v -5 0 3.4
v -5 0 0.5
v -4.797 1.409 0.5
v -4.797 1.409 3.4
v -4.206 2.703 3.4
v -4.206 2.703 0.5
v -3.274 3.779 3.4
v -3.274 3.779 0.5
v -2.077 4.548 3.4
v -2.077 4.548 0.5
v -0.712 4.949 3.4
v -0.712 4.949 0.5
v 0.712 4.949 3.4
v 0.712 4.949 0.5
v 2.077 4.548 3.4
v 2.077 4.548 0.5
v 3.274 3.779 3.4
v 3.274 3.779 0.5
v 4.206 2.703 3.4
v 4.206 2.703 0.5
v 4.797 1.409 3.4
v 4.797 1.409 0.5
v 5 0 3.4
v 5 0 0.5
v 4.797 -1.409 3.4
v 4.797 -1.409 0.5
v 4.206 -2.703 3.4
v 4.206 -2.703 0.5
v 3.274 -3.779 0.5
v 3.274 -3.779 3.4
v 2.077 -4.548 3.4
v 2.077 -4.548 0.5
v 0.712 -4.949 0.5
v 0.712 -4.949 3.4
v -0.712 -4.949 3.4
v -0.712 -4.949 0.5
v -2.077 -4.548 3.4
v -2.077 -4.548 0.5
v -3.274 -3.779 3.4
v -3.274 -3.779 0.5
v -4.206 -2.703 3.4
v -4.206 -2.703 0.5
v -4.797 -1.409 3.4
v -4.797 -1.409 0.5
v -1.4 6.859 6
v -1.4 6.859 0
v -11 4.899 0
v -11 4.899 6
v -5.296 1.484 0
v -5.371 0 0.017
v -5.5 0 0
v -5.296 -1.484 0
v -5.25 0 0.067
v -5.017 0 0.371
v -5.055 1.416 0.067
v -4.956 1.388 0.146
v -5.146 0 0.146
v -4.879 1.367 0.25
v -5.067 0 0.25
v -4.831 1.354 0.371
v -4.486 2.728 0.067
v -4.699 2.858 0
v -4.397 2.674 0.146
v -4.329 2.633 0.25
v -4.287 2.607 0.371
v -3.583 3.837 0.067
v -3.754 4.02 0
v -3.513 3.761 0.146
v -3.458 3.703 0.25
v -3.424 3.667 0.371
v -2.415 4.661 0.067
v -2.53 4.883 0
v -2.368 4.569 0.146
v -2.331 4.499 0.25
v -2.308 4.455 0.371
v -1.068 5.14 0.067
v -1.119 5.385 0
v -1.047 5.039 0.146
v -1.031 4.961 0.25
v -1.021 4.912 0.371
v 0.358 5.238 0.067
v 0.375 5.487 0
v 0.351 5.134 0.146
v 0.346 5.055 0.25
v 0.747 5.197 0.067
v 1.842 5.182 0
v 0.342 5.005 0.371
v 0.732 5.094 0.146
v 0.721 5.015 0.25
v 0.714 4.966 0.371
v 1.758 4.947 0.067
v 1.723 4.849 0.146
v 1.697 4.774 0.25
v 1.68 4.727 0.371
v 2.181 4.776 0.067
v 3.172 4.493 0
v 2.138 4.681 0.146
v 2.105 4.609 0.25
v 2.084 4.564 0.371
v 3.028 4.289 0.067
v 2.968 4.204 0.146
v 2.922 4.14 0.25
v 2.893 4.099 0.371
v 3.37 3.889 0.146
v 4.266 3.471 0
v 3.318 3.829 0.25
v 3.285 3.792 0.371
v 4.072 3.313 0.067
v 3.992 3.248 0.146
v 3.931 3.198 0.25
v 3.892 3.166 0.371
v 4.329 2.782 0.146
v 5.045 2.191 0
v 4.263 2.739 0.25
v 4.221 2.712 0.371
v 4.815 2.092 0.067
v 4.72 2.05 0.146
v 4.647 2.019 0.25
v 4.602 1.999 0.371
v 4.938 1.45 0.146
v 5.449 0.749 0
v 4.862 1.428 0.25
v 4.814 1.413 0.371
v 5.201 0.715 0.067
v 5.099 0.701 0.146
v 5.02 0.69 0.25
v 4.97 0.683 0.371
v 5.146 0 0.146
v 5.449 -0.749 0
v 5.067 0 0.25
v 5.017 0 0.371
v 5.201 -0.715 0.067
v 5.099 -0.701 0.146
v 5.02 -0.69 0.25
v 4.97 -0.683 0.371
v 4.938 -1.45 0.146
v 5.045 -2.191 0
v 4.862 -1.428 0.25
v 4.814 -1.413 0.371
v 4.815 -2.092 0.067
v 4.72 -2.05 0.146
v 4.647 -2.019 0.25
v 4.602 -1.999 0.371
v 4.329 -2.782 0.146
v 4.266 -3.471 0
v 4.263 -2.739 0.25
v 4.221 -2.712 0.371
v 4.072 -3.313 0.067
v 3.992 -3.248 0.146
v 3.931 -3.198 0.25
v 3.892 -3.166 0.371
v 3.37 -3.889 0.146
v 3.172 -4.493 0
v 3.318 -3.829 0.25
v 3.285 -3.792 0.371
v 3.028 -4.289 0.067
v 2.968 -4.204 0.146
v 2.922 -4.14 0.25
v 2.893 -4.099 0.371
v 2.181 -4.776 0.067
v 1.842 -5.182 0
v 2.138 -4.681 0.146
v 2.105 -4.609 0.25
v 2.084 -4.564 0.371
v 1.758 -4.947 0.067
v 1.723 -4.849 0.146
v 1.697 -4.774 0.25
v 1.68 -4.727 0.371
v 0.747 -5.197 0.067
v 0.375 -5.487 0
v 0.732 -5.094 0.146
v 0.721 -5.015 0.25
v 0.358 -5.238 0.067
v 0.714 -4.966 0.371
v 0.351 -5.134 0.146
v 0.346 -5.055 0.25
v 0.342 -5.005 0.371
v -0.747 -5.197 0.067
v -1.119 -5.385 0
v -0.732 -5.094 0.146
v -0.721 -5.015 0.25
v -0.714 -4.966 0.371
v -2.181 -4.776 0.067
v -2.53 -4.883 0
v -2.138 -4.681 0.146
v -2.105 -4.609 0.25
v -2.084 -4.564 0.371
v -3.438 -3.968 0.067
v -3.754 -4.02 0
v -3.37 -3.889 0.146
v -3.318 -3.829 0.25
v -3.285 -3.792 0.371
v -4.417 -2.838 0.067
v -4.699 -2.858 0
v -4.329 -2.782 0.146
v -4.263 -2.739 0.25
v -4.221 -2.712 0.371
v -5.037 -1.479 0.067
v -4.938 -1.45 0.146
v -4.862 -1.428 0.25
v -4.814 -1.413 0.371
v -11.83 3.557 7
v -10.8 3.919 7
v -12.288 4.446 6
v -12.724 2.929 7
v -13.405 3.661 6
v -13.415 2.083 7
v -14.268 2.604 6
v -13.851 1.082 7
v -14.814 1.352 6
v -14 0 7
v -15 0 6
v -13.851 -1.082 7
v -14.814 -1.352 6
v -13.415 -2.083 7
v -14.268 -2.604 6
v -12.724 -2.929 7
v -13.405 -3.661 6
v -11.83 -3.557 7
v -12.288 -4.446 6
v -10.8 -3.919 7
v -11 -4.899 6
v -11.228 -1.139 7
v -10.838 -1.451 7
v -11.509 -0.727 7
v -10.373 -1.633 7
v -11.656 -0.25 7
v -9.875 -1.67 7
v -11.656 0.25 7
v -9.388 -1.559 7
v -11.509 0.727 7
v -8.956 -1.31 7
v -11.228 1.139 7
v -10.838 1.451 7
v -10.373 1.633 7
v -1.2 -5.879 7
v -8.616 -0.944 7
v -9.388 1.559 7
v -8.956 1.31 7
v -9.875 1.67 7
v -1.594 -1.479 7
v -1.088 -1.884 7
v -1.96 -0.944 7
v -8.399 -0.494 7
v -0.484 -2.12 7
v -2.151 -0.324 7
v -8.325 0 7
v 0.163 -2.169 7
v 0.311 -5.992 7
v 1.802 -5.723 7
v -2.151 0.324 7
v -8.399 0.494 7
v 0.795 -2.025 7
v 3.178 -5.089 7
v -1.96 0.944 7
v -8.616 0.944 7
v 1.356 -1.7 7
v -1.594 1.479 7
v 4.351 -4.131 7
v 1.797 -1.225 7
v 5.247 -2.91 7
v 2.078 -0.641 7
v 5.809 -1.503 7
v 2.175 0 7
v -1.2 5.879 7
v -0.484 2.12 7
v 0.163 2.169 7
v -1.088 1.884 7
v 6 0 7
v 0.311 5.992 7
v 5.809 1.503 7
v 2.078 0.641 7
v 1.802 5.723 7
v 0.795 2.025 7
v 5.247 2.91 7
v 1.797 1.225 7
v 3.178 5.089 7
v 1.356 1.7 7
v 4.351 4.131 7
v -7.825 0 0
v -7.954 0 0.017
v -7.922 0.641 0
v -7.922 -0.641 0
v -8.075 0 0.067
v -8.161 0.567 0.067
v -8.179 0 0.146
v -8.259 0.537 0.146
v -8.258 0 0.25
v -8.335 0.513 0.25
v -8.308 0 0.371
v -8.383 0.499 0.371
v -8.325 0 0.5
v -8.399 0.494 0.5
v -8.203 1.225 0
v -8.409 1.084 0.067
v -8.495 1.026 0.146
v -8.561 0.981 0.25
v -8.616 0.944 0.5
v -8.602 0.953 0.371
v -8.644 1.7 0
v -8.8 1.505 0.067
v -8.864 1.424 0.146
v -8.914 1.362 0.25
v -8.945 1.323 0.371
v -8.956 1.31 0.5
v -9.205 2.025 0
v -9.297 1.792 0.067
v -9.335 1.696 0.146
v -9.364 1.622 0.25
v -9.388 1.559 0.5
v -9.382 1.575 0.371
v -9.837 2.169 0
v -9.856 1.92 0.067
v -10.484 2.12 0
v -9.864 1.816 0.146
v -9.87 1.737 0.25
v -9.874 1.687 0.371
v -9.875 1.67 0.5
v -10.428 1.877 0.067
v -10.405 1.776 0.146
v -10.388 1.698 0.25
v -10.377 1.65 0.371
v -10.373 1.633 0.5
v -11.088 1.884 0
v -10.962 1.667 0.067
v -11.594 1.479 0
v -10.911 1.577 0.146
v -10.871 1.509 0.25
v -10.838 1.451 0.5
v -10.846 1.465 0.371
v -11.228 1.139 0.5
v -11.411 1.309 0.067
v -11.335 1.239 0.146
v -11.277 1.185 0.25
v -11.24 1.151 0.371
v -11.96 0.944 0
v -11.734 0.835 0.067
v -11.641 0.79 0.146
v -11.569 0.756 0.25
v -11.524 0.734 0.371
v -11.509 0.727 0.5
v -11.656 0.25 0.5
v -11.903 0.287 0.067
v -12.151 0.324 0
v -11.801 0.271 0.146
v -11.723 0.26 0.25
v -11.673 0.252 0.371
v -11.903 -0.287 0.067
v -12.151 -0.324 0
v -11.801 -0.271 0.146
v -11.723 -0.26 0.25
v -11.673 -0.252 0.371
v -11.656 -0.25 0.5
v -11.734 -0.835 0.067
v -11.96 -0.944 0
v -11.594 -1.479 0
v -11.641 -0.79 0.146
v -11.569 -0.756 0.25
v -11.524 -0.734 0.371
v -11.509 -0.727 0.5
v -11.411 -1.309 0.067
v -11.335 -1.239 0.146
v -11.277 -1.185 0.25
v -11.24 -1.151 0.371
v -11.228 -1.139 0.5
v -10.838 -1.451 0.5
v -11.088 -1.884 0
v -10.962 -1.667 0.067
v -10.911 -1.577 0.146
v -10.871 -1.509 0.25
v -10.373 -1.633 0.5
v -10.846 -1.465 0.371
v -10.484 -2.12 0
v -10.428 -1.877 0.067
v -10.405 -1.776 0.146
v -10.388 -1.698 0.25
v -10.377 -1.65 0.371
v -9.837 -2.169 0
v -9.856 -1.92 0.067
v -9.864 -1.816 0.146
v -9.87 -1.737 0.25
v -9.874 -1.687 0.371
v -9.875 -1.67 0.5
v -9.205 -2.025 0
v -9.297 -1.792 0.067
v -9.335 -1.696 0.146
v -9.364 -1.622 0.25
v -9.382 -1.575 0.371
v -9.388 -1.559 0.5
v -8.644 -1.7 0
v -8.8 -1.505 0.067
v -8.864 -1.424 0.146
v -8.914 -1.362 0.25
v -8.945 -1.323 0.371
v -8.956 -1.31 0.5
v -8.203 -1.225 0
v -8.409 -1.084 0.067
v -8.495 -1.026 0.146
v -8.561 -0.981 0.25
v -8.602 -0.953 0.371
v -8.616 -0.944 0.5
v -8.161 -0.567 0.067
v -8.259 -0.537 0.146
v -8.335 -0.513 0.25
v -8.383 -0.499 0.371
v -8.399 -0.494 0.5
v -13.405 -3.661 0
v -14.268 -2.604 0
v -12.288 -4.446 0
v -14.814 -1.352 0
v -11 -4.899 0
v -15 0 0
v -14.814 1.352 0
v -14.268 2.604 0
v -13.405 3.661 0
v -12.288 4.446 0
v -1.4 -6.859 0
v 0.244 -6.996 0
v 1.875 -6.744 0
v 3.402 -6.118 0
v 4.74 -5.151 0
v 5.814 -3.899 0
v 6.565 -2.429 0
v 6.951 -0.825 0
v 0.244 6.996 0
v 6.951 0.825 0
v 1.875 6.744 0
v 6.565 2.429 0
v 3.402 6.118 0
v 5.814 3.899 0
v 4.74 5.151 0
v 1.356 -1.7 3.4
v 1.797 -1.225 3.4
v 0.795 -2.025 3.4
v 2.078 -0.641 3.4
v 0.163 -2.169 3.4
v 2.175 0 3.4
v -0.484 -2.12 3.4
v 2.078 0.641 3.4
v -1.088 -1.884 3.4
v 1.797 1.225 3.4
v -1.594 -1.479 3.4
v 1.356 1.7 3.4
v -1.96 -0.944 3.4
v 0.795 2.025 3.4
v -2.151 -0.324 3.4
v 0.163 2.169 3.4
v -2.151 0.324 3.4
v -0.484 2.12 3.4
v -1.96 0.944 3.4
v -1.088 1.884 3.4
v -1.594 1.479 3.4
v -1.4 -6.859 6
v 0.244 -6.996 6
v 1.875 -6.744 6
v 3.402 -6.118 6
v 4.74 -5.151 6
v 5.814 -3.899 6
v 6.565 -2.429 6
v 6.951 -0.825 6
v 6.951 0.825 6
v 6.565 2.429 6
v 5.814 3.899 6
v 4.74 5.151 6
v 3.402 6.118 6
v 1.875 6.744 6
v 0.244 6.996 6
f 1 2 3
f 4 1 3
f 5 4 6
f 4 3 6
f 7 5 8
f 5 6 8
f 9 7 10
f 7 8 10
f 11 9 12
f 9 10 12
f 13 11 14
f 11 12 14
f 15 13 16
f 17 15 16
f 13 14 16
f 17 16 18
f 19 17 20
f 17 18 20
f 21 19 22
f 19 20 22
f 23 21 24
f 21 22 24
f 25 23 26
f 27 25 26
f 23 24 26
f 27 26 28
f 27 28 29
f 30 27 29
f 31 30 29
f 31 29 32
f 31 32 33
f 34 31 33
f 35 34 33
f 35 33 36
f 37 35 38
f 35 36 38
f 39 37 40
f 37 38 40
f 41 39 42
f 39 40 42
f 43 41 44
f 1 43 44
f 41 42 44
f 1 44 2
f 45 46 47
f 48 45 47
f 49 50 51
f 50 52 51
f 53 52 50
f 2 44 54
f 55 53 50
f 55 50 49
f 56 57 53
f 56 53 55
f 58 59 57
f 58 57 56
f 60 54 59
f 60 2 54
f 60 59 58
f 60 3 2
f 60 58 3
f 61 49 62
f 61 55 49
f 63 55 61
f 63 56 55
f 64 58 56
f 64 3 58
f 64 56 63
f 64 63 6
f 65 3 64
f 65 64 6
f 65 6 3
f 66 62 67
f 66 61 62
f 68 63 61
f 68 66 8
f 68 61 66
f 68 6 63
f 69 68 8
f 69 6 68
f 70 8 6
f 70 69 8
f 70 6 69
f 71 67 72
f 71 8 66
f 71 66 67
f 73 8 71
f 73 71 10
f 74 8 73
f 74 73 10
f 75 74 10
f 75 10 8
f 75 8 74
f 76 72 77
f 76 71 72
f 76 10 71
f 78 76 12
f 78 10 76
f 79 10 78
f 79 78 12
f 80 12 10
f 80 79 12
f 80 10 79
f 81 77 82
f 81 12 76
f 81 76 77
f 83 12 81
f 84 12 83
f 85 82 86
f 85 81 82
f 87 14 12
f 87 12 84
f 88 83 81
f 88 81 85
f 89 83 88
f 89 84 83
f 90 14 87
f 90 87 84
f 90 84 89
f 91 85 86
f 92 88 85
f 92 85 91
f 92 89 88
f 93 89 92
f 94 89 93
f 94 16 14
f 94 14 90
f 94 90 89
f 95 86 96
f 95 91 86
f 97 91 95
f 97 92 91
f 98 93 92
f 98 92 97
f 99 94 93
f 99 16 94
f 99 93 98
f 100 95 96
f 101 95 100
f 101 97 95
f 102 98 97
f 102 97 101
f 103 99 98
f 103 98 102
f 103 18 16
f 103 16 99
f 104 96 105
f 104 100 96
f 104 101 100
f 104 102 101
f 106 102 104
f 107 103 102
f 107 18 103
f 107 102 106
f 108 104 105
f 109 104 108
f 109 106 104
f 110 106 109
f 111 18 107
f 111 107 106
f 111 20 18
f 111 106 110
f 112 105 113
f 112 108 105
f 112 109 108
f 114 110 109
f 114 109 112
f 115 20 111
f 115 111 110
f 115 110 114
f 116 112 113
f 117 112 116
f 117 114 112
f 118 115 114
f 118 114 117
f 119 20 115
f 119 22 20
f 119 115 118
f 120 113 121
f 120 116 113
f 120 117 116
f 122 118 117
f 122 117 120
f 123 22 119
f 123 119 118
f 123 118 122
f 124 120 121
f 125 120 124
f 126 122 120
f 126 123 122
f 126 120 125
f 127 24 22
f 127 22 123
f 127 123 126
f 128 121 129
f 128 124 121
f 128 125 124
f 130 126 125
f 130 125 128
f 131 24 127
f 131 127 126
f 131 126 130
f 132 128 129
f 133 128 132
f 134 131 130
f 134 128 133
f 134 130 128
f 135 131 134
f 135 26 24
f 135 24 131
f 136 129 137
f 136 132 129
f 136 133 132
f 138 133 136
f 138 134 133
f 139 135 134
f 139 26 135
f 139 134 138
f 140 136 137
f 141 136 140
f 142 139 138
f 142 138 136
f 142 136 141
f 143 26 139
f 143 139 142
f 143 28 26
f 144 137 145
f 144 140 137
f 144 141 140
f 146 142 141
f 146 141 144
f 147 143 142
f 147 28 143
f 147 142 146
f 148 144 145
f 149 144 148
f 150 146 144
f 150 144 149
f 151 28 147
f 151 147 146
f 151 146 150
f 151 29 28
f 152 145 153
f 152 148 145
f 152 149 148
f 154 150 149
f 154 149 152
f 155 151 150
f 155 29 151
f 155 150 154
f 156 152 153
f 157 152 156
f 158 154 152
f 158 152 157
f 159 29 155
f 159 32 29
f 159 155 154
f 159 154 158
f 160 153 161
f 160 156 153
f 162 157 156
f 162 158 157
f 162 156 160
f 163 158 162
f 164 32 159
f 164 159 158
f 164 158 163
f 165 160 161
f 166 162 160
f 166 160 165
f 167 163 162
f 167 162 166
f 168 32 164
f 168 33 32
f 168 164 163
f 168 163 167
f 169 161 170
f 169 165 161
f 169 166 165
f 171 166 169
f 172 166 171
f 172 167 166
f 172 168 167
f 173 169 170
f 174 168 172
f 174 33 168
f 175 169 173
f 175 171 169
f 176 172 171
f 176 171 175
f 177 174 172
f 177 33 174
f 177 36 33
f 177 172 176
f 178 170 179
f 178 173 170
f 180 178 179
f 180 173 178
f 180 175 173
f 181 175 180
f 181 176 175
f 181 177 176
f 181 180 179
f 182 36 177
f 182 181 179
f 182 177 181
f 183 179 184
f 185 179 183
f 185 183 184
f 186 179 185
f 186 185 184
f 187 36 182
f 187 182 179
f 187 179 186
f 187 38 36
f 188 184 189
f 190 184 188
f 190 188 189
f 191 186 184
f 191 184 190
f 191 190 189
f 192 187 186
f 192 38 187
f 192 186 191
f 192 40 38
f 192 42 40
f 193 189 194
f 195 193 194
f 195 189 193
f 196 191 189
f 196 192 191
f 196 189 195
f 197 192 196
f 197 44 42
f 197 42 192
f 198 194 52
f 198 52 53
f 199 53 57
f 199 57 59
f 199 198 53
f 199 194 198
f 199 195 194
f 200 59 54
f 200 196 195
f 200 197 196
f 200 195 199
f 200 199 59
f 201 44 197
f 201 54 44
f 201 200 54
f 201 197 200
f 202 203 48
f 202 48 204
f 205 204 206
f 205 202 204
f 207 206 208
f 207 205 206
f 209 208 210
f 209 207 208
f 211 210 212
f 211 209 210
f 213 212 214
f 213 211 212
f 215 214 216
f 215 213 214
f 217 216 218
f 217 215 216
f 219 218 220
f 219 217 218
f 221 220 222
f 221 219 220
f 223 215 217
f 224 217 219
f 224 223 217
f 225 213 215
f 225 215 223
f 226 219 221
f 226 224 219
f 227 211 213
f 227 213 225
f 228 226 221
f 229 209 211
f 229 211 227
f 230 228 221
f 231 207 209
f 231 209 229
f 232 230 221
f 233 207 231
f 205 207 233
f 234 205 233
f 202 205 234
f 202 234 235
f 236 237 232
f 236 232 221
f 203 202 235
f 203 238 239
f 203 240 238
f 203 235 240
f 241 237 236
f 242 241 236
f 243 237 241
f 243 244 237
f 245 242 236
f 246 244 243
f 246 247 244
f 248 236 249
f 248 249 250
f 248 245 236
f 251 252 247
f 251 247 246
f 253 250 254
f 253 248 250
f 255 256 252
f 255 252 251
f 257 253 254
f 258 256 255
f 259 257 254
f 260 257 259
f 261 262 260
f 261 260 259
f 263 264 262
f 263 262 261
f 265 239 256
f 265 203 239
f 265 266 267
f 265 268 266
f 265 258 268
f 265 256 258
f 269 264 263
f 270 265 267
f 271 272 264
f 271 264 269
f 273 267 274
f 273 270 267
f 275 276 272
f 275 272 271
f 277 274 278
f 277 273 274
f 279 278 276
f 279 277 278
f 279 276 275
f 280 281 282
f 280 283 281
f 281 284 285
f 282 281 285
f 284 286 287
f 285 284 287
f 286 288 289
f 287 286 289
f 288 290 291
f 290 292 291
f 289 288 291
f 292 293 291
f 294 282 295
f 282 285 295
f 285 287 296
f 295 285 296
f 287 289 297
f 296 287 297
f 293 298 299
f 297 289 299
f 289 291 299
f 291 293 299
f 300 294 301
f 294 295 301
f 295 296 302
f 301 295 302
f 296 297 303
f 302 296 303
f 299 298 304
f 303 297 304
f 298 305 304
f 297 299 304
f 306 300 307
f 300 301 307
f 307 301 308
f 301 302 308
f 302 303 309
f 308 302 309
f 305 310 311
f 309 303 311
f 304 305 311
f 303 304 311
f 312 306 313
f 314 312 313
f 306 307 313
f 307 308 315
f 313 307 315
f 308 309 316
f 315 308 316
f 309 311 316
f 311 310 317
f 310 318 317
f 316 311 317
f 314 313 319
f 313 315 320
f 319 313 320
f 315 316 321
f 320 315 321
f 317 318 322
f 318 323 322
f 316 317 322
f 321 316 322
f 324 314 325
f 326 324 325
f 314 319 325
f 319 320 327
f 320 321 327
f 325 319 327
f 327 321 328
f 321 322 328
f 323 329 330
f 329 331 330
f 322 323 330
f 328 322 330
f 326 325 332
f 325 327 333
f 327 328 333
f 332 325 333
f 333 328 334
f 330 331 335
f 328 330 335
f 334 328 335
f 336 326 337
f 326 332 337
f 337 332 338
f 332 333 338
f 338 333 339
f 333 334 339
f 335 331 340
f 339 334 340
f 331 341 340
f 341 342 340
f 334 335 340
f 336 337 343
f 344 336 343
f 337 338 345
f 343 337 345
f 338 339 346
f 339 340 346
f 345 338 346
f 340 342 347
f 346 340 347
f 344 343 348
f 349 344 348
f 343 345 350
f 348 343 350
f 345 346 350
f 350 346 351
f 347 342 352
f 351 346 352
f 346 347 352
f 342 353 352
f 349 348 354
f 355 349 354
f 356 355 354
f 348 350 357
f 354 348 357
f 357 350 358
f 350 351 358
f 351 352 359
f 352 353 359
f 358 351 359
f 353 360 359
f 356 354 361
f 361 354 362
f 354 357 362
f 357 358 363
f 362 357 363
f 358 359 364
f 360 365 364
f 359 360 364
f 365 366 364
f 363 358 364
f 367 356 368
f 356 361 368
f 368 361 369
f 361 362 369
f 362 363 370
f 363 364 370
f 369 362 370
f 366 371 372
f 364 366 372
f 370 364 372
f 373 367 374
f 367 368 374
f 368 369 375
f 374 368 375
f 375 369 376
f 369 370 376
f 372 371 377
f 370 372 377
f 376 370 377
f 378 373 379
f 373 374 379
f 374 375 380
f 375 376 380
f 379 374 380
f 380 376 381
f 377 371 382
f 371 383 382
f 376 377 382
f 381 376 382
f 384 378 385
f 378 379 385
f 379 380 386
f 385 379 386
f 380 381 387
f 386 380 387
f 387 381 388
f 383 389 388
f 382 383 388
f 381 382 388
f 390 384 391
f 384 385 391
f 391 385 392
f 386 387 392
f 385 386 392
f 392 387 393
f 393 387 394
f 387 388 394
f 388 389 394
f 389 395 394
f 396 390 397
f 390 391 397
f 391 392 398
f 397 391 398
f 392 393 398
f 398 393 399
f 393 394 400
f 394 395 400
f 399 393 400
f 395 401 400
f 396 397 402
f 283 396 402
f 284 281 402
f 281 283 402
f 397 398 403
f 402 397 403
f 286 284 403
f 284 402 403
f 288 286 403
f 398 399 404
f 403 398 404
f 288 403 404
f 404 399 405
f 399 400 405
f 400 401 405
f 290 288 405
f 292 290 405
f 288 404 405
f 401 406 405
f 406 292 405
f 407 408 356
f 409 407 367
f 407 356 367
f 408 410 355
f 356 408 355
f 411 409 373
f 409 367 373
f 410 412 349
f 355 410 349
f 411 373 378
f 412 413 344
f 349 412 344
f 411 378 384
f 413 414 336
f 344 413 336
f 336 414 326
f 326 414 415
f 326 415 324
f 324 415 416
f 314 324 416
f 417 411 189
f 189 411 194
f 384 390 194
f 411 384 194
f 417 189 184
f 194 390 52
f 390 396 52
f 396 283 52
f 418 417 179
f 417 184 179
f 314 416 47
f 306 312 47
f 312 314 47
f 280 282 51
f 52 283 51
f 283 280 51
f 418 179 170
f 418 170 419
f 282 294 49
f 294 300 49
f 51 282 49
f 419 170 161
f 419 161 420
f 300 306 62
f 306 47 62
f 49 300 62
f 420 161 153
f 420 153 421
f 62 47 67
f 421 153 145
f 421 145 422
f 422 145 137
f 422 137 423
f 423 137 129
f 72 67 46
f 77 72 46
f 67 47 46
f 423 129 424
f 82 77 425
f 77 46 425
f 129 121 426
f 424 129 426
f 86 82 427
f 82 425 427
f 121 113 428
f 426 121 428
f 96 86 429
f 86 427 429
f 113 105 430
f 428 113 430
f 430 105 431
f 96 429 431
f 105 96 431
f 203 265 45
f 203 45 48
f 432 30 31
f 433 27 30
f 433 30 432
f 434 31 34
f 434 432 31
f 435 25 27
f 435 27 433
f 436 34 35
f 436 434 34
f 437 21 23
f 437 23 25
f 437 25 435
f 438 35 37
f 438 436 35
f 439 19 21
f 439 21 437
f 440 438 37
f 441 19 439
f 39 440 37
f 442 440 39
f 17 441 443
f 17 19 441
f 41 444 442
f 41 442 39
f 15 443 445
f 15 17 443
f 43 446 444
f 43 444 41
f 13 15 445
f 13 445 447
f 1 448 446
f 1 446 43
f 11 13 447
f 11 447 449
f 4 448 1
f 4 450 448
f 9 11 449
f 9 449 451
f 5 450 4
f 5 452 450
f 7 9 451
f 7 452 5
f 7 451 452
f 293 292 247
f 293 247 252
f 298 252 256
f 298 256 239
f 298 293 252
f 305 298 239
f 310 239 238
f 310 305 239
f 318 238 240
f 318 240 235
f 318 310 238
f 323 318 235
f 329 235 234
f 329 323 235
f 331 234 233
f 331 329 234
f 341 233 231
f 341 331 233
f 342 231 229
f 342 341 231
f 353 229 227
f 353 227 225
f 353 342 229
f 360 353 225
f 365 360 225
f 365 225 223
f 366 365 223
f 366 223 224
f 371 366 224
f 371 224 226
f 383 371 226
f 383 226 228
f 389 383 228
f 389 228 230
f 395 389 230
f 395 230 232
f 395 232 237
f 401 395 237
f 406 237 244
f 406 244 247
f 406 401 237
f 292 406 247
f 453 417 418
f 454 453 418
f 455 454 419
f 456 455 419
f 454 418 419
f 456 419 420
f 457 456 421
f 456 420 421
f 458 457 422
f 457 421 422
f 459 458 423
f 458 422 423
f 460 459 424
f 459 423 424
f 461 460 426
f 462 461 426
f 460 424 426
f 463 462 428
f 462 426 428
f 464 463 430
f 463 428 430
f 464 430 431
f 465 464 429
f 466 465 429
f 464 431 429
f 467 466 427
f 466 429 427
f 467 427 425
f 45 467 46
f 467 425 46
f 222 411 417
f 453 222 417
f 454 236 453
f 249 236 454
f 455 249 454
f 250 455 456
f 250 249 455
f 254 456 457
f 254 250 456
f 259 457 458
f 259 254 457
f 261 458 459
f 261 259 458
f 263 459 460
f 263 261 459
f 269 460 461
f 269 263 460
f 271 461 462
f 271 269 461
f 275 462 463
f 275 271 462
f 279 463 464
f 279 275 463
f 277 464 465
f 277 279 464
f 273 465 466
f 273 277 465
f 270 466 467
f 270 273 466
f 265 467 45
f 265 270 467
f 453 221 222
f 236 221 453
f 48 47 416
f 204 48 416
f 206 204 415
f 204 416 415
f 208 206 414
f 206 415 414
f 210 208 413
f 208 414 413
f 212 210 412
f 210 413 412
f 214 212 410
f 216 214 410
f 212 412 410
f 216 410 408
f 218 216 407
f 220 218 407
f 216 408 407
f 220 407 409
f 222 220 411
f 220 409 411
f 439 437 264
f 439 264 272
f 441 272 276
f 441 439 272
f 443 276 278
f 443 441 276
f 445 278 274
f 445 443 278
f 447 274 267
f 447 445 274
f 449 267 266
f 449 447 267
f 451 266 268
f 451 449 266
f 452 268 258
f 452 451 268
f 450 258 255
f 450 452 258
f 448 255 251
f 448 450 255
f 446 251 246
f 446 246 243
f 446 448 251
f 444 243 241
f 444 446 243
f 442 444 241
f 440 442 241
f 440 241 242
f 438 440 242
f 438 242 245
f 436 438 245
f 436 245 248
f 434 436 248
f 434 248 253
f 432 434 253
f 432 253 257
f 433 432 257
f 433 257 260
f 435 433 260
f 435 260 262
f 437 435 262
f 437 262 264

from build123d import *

# Parameters (mm, degrees)
SKETCH1_R           = 2.175
SKETCH1_R_2         = 1.675
BOSS_EXTRUDE1_DEPTH = 7
SKETCH2_R           = 5
CUT_EXTRUDE1_DEPTH  = 3.4
CHAMFER1_SIZE       = 1
FILLET1_R           = 0.5


with BuildPart() as part:
    # Sketch1 → Boss-Extrude1 (new body)
    with BuildSketch(Plane.XY):
        with BuildLine():
            Line((-1.4, 6.85857128), (-11, 4.898979486))
            ThreePointArc((-11, 4.898979486), (-15, 0), (-11, -4.898979486))
            Line((-11, -4.898979486), (-1.4, -6.85857128))
            ThreePointArc((-1.4, -6.85857128), (7, 0), (-1.4, 6.85857128))
        make_face()
        Circle(SKETCH1_R, mode=Mode.SUBTRACT)
        with Locations((-10, 0)):
            Circle(SKETCH1_R_2, mode=Mode.SUBTRACT)
    extrude(amount=BOSS_EXTRUDE1_DEPTH)

    # Sketch2 → Cut-Extrude1 (cut)
    with BuildSketch(Plane(origin=(0, 0, 0), x_dir=(-1, 0, 0), z_dir=(0, 0, -1))):
        Circle(SKETCH2_R)
    extrude(amount=-CUT_EXTRUDE1_DEPTH, mode=Mode.SUBTRACT)

    # Chamfer1
    chamfer1_edges = [part.edges().sort_by_distance(p)[0] for p in [
        (-15, 0, 7),
        (-6.2, -5.878775383, 7),
        (7, 0, 7),
        (-6.2, 5.878775383, 7),
    ]]
    chamfer(chamfer1_edges, length=CHAMFER1_SIZE)

    # Fillet1
    fillet1_edges = [part.edges().sort_by_distance(p)[0] for p in [
        (-11.675, 0, 0),
        (5, 0, 0),
    ]]
    fillet(fillet1_edges, radius=FILLET1_R)


solid = part.part
